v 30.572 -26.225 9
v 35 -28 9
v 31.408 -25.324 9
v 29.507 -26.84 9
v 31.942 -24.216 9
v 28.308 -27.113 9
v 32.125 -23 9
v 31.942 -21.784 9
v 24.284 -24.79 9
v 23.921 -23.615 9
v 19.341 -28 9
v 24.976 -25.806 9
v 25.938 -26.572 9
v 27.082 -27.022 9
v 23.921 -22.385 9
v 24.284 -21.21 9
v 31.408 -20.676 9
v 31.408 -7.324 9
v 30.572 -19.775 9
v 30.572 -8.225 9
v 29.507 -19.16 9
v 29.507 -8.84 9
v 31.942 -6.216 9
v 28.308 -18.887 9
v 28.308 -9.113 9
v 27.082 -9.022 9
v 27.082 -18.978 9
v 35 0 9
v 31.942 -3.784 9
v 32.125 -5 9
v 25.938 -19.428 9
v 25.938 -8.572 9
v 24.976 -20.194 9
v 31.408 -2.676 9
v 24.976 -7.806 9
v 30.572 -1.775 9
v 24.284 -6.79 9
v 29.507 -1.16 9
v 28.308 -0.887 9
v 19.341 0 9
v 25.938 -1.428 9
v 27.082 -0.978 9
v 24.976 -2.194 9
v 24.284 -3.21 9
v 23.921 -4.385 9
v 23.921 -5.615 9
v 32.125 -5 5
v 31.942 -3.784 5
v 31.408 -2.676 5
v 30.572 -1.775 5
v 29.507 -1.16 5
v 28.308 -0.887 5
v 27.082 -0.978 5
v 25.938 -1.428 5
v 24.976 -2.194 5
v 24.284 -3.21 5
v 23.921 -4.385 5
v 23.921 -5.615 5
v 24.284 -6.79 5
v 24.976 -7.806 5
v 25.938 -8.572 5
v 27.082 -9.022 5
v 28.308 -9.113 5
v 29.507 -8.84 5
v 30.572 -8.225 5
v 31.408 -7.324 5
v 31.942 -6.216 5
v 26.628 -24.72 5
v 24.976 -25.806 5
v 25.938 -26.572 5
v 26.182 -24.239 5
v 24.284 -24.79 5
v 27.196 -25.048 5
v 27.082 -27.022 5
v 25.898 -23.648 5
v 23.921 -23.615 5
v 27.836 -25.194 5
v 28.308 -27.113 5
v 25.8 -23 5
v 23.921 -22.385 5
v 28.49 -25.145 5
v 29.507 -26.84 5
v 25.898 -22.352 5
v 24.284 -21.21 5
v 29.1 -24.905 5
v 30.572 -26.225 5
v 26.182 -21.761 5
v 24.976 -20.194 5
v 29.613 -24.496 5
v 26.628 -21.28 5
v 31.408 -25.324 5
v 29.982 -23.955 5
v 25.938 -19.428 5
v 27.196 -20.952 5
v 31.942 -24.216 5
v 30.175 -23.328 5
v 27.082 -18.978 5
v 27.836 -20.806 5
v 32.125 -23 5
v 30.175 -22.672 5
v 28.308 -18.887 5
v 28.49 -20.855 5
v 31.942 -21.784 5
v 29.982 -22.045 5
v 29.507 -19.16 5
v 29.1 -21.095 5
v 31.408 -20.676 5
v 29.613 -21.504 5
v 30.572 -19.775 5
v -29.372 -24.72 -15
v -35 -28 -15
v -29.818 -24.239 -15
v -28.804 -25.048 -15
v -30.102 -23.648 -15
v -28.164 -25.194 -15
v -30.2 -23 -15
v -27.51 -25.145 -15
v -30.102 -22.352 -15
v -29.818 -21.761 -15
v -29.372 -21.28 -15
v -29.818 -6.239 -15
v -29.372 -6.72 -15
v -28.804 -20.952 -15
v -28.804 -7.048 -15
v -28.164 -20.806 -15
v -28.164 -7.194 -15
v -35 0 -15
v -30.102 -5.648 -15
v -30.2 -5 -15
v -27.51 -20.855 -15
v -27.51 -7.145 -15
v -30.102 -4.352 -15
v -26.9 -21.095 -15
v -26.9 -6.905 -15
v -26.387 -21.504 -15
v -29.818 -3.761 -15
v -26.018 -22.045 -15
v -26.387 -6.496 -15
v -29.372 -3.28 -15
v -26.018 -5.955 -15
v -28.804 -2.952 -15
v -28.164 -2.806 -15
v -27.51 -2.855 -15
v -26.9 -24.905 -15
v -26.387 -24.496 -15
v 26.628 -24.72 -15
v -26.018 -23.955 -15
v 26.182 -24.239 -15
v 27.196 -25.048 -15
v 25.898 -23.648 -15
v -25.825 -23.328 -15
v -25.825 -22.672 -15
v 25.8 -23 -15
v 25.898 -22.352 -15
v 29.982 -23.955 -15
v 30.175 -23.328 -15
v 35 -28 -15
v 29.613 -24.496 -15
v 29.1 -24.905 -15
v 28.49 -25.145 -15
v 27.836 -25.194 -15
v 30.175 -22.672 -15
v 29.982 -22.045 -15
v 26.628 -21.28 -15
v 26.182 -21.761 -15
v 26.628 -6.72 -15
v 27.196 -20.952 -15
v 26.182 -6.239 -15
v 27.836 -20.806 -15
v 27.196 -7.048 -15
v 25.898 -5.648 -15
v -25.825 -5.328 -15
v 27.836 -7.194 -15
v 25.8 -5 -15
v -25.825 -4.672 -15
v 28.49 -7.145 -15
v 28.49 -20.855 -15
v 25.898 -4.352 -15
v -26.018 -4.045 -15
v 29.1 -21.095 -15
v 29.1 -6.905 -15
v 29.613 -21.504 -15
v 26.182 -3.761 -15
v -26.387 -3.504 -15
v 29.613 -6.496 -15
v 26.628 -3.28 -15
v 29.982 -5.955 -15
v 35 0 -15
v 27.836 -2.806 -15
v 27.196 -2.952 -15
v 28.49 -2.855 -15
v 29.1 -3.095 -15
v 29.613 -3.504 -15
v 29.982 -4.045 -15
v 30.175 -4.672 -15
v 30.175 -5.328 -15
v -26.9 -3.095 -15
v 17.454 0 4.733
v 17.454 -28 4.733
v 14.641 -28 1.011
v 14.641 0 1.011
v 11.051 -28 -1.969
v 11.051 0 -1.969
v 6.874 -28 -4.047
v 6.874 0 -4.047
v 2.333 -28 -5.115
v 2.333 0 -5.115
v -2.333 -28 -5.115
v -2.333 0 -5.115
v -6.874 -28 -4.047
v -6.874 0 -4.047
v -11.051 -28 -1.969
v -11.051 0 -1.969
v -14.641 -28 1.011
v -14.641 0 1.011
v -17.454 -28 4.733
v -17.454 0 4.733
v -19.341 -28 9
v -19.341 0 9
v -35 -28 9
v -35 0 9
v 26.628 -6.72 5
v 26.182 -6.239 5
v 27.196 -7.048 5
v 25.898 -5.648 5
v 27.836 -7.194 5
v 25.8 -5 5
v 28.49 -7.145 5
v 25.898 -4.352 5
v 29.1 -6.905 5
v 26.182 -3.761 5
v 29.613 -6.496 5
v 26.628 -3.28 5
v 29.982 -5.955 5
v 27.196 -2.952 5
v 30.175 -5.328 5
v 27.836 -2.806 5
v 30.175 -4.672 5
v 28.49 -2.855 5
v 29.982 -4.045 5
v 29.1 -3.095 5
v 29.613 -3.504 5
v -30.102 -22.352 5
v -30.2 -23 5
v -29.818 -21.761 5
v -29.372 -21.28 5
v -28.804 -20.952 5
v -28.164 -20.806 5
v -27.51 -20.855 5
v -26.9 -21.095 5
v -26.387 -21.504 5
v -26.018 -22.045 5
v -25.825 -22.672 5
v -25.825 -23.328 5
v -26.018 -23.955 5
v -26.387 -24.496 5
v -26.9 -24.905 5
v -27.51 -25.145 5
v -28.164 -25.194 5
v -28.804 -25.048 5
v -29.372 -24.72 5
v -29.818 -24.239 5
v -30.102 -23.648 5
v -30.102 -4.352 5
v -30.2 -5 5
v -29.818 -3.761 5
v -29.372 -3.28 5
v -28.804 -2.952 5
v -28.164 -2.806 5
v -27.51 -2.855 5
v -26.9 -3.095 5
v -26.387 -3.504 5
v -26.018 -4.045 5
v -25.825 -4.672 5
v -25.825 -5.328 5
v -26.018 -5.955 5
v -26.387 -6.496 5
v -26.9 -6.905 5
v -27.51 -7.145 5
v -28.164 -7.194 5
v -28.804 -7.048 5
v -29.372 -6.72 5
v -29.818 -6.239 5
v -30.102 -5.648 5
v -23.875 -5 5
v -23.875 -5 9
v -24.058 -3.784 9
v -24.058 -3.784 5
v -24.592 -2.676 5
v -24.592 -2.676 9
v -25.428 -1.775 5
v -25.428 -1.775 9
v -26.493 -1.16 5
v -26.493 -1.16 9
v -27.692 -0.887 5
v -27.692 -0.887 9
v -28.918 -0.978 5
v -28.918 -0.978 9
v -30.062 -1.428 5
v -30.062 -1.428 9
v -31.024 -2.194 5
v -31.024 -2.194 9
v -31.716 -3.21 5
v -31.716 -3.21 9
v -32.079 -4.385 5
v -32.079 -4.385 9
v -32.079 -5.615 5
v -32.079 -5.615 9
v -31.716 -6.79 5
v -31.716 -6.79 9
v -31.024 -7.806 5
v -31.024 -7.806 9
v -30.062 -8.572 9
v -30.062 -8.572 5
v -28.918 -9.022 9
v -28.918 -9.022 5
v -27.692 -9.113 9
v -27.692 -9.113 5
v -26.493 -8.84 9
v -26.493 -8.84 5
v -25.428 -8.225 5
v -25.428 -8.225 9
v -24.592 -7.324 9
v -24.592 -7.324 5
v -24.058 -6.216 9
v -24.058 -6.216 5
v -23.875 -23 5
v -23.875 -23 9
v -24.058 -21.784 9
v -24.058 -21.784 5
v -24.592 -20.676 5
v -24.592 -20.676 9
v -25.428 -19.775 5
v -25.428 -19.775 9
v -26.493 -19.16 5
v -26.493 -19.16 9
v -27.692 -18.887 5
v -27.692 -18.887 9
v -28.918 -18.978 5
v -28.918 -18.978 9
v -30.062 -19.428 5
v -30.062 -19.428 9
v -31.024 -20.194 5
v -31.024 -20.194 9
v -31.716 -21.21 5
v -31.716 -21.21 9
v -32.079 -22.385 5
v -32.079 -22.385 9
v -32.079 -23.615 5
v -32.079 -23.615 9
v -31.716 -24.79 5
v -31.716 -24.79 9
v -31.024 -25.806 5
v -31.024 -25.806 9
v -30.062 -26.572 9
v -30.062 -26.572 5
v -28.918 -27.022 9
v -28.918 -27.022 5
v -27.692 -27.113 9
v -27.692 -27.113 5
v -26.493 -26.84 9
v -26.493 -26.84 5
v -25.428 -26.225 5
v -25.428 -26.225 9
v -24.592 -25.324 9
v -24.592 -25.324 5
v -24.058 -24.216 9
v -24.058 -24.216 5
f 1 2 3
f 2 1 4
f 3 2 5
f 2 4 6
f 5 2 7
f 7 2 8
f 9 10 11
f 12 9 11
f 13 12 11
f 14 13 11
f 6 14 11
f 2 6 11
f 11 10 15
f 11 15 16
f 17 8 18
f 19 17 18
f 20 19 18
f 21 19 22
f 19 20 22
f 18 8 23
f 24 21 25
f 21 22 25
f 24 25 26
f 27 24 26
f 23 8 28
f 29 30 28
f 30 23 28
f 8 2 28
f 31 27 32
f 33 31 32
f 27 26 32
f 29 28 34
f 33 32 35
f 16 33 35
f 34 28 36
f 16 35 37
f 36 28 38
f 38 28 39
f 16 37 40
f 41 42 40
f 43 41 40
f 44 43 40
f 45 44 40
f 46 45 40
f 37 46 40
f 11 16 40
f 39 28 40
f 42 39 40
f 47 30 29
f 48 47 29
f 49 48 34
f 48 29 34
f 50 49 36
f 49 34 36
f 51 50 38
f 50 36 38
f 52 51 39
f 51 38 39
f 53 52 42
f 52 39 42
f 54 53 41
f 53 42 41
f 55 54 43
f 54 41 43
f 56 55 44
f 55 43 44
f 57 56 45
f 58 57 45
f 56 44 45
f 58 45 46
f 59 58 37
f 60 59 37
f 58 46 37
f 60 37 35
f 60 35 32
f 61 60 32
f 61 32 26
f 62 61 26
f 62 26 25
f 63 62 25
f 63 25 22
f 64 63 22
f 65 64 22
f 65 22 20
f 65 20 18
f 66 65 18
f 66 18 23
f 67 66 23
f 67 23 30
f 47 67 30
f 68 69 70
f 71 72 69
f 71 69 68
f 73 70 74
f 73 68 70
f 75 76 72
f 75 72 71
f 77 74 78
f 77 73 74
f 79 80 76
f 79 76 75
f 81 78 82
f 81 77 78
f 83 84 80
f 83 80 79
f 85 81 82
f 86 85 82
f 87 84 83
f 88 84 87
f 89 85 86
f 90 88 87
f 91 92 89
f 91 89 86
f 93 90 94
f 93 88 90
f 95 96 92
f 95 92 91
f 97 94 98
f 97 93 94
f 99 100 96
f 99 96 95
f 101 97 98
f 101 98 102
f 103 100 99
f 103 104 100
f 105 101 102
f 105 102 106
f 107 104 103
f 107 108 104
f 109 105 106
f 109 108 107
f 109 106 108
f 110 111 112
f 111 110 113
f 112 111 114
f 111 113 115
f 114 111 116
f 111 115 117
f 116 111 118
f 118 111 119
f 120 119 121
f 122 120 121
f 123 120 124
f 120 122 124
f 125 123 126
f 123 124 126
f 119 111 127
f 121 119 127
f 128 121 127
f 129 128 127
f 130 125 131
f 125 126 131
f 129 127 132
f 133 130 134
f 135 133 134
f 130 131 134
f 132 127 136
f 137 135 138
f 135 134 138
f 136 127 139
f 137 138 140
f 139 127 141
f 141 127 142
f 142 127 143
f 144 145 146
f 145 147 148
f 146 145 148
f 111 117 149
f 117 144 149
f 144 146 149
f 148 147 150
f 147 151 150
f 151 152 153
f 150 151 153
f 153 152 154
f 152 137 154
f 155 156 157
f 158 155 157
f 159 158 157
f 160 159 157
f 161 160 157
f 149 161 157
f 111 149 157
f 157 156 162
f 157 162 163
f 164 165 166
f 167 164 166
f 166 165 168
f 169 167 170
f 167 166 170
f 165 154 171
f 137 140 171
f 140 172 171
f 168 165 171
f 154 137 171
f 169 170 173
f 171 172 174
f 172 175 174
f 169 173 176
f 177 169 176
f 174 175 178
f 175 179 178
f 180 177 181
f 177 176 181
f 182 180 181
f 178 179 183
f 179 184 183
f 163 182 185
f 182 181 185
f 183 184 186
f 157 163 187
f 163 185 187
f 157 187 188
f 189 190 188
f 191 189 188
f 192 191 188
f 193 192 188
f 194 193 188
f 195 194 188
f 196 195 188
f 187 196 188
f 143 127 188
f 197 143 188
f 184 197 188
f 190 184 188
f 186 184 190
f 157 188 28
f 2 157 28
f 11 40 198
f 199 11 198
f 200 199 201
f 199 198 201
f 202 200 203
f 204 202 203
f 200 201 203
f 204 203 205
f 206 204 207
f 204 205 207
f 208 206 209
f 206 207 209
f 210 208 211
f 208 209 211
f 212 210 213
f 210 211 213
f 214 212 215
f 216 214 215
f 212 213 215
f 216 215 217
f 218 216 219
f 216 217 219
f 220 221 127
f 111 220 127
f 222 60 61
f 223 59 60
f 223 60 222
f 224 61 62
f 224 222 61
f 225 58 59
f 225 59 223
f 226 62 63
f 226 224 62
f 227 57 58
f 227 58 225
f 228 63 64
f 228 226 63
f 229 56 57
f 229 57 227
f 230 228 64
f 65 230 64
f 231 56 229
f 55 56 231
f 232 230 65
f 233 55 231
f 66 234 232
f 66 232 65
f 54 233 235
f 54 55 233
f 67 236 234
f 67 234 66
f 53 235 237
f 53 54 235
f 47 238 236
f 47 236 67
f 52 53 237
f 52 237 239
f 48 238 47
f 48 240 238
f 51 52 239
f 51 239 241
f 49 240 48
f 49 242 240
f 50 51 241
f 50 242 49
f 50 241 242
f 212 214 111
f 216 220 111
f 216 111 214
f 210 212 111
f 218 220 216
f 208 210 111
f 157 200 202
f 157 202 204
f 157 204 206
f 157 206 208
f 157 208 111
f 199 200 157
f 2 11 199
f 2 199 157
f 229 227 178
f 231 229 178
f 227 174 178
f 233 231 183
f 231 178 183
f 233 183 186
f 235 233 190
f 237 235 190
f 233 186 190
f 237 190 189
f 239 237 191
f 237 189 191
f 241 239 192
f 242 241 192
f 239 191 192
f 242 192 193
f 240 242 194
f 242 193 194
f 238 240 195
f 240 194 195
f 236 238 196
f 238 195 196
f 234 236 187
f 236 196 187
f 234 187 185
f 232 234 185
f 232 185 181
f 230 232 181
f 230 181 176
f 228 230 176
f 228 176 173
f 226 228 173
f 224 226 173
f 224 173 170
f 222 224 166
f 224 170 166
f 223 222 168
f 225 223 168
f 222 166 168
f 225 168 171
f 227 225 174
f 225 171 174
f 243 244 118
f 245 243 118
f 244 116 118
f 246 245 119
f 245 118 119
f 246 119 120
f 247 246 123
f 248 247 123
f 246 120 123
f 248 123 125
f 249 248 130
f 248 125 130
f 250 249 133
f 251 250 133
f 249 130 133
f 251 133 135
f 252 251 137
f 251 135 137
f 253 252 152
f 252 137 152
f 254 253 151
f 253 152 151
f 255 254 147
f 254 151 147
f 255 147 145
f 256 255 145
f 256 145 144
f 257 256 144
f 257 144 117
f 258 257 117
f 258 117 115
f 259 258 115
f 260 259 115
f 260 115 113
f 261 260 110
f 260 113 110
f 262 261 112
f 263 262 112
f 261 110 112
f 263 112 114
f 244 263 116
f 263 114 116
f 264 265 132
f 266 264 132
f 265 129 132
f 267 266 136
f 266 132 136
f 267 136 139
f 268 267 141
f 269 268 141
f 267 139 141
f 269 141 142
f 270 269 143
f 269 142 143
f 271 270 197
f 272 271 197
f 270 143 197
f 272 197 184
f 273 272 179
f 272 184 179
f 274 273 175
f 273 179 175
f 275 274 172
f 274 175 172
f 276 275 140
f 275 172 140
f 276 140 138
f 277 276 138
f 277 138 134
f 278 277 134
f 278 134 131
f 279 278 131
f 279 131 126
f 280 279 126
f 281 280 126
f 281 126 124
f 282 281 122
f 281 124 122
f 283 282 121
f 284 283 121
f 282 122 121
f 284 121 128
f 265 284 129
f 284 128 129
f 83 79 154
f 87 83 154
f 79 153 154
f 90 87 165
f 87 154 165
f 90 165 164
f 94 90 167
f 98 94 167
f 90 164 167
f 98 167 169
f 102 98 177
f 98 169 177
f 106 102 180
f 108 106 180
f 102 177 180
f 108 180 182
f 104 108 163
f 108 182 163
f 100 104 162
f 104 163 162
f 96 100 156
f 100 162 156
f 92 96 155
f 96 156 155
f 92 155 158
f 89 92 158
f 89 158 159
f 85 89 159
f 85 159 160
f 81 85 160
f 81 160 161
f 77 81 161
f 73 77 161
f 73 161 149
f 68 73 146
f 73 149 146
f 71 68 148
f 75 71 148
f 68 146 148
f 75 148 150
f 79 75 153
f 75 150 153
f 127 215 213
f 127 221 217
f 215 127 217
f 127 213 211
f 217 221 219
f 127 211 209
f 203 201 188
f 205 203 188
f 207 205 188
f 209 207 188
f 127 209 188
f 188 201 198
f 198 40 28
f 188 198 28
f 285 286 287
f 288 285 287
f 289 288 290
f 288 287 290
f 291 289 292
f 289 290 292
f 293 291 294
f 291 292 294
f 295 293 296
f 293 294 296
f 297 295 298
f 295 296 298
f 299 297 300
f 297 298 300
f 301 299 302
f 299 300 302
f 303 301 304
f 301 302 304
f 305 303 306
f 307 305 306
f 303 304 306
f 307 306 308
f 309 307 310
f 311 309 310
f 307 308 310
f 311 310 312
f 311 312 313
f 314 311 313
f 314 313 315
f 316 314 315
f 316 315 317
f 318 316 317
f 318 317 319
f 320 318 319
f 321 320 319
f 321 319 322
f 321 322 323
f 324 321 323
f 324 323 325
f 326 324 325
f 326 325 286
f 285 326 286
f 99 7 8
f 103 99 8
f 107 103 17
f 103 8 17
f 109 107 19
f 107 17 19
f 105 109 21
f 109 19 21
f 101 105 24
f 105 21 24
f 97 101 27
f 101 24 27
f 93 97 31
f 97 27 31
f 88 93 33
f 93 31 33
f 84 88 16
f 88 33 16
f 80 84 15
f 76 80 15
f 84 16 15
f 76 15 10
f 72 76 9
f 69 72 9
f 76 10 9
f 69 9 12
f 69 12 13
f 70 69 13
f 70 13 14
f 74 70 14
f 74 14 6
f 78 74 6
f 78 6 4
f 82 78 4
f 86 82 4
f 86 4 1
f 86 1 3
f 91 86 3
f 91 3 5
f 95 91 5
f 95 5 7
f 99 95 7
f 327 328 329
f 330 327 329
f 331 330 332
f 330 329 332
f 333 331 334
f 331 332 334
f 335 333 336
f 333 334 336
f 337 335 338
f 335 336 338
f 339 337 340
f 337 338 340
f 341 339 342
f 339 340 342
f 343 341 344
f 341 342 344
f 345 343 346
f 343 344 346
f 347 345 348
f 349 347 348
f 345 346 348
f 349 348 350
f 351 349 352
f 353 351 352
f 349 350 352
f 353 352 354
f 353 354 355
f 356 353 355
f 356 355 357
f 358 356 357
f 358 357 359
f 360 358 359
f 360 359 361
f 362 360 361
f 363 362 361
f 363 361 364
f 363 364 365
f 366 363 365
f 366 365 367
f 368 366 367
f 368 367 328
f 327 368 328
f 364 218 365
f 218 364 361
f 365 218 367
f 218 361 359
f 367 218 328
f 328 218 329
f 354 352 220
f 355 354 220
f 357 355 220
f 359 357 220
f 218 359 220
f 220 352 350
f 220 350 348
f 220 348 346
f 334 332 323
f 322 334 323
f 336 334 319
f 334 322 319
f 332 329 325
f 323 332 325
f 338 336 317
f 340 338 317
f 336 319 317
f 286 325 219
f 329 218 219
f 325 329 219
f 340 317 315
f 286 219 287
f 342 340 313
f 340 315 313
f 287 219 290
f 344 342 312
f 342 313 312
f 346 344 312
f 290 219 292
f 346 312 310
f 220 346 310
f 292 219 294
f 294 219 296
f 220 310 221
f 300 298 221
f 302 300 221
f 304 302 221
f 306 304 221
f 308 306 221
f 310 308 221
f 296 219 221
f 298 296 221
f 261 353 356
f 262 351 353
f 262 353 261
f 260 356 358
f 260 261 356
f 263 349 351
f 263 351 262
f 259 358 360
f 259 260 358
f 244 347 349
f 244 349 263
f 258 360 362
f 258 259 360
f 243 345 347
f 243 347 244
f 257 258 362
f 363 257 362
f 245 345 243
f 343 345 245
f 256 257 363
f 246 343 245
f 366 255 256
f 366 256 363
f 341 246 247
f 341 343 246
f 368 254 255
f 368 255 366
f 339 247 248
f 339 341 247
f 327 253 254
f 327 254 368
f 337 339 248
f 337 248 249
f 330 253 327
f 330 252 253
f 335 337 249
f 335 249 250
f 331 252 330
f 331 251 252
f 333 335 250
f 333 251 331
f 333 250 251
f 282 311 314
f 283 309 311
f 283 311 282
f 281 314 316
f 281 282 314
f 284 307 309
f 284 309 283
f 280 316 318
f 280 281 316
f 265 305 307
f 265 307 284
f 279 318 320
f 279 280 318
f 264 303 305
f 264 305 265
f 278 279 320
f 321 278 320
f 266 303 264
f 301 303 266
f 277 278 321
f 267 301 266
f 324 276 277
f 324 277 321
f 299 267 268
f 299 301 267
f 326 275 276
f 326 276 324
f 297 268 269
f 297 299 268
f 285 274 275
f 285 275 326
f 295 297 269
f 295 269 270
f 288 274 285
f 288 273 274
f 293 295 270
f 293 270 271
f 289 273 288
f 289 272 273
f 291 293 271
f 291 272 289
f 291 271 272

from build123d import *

# Parameters (mm, degrees)
F1_DEPTH       = 28
F3_D           = 4.4
F3_CBORE_D     = 8.25
F3_CBORE_DEPTH = 4


with BuildPart() as f1:
    # F0 (on Front) → F1 (new body)
    with BuildSketch(Plane.XZ):
        with BuildLine():
            Line((-35, -15), (35, -15))
            Line((35, -15), (35, 9))
            Line((35, 9), (19.3406954373, 9))
            ThreePointArc((19.3406954373, 9), (0, -5.25), (-19.3406954373, 9))
            Line((-19.3406954373, 9), (-35, 9))
            Line((-35, 9), (-35, -15))
        make_face()
    extrude(amount=F1_DEPTH)

    # F3 (through all)
    with Locations(Plane.XY.offset(9)):
        with Locations((-28, -5), (-28, -23), (28, -23), (28, -5)):
            CounterBoreHole(F3_D / 2, F3_CBORE_D / 2, F3_CBORE_DEPTH)


solid = f1.part
